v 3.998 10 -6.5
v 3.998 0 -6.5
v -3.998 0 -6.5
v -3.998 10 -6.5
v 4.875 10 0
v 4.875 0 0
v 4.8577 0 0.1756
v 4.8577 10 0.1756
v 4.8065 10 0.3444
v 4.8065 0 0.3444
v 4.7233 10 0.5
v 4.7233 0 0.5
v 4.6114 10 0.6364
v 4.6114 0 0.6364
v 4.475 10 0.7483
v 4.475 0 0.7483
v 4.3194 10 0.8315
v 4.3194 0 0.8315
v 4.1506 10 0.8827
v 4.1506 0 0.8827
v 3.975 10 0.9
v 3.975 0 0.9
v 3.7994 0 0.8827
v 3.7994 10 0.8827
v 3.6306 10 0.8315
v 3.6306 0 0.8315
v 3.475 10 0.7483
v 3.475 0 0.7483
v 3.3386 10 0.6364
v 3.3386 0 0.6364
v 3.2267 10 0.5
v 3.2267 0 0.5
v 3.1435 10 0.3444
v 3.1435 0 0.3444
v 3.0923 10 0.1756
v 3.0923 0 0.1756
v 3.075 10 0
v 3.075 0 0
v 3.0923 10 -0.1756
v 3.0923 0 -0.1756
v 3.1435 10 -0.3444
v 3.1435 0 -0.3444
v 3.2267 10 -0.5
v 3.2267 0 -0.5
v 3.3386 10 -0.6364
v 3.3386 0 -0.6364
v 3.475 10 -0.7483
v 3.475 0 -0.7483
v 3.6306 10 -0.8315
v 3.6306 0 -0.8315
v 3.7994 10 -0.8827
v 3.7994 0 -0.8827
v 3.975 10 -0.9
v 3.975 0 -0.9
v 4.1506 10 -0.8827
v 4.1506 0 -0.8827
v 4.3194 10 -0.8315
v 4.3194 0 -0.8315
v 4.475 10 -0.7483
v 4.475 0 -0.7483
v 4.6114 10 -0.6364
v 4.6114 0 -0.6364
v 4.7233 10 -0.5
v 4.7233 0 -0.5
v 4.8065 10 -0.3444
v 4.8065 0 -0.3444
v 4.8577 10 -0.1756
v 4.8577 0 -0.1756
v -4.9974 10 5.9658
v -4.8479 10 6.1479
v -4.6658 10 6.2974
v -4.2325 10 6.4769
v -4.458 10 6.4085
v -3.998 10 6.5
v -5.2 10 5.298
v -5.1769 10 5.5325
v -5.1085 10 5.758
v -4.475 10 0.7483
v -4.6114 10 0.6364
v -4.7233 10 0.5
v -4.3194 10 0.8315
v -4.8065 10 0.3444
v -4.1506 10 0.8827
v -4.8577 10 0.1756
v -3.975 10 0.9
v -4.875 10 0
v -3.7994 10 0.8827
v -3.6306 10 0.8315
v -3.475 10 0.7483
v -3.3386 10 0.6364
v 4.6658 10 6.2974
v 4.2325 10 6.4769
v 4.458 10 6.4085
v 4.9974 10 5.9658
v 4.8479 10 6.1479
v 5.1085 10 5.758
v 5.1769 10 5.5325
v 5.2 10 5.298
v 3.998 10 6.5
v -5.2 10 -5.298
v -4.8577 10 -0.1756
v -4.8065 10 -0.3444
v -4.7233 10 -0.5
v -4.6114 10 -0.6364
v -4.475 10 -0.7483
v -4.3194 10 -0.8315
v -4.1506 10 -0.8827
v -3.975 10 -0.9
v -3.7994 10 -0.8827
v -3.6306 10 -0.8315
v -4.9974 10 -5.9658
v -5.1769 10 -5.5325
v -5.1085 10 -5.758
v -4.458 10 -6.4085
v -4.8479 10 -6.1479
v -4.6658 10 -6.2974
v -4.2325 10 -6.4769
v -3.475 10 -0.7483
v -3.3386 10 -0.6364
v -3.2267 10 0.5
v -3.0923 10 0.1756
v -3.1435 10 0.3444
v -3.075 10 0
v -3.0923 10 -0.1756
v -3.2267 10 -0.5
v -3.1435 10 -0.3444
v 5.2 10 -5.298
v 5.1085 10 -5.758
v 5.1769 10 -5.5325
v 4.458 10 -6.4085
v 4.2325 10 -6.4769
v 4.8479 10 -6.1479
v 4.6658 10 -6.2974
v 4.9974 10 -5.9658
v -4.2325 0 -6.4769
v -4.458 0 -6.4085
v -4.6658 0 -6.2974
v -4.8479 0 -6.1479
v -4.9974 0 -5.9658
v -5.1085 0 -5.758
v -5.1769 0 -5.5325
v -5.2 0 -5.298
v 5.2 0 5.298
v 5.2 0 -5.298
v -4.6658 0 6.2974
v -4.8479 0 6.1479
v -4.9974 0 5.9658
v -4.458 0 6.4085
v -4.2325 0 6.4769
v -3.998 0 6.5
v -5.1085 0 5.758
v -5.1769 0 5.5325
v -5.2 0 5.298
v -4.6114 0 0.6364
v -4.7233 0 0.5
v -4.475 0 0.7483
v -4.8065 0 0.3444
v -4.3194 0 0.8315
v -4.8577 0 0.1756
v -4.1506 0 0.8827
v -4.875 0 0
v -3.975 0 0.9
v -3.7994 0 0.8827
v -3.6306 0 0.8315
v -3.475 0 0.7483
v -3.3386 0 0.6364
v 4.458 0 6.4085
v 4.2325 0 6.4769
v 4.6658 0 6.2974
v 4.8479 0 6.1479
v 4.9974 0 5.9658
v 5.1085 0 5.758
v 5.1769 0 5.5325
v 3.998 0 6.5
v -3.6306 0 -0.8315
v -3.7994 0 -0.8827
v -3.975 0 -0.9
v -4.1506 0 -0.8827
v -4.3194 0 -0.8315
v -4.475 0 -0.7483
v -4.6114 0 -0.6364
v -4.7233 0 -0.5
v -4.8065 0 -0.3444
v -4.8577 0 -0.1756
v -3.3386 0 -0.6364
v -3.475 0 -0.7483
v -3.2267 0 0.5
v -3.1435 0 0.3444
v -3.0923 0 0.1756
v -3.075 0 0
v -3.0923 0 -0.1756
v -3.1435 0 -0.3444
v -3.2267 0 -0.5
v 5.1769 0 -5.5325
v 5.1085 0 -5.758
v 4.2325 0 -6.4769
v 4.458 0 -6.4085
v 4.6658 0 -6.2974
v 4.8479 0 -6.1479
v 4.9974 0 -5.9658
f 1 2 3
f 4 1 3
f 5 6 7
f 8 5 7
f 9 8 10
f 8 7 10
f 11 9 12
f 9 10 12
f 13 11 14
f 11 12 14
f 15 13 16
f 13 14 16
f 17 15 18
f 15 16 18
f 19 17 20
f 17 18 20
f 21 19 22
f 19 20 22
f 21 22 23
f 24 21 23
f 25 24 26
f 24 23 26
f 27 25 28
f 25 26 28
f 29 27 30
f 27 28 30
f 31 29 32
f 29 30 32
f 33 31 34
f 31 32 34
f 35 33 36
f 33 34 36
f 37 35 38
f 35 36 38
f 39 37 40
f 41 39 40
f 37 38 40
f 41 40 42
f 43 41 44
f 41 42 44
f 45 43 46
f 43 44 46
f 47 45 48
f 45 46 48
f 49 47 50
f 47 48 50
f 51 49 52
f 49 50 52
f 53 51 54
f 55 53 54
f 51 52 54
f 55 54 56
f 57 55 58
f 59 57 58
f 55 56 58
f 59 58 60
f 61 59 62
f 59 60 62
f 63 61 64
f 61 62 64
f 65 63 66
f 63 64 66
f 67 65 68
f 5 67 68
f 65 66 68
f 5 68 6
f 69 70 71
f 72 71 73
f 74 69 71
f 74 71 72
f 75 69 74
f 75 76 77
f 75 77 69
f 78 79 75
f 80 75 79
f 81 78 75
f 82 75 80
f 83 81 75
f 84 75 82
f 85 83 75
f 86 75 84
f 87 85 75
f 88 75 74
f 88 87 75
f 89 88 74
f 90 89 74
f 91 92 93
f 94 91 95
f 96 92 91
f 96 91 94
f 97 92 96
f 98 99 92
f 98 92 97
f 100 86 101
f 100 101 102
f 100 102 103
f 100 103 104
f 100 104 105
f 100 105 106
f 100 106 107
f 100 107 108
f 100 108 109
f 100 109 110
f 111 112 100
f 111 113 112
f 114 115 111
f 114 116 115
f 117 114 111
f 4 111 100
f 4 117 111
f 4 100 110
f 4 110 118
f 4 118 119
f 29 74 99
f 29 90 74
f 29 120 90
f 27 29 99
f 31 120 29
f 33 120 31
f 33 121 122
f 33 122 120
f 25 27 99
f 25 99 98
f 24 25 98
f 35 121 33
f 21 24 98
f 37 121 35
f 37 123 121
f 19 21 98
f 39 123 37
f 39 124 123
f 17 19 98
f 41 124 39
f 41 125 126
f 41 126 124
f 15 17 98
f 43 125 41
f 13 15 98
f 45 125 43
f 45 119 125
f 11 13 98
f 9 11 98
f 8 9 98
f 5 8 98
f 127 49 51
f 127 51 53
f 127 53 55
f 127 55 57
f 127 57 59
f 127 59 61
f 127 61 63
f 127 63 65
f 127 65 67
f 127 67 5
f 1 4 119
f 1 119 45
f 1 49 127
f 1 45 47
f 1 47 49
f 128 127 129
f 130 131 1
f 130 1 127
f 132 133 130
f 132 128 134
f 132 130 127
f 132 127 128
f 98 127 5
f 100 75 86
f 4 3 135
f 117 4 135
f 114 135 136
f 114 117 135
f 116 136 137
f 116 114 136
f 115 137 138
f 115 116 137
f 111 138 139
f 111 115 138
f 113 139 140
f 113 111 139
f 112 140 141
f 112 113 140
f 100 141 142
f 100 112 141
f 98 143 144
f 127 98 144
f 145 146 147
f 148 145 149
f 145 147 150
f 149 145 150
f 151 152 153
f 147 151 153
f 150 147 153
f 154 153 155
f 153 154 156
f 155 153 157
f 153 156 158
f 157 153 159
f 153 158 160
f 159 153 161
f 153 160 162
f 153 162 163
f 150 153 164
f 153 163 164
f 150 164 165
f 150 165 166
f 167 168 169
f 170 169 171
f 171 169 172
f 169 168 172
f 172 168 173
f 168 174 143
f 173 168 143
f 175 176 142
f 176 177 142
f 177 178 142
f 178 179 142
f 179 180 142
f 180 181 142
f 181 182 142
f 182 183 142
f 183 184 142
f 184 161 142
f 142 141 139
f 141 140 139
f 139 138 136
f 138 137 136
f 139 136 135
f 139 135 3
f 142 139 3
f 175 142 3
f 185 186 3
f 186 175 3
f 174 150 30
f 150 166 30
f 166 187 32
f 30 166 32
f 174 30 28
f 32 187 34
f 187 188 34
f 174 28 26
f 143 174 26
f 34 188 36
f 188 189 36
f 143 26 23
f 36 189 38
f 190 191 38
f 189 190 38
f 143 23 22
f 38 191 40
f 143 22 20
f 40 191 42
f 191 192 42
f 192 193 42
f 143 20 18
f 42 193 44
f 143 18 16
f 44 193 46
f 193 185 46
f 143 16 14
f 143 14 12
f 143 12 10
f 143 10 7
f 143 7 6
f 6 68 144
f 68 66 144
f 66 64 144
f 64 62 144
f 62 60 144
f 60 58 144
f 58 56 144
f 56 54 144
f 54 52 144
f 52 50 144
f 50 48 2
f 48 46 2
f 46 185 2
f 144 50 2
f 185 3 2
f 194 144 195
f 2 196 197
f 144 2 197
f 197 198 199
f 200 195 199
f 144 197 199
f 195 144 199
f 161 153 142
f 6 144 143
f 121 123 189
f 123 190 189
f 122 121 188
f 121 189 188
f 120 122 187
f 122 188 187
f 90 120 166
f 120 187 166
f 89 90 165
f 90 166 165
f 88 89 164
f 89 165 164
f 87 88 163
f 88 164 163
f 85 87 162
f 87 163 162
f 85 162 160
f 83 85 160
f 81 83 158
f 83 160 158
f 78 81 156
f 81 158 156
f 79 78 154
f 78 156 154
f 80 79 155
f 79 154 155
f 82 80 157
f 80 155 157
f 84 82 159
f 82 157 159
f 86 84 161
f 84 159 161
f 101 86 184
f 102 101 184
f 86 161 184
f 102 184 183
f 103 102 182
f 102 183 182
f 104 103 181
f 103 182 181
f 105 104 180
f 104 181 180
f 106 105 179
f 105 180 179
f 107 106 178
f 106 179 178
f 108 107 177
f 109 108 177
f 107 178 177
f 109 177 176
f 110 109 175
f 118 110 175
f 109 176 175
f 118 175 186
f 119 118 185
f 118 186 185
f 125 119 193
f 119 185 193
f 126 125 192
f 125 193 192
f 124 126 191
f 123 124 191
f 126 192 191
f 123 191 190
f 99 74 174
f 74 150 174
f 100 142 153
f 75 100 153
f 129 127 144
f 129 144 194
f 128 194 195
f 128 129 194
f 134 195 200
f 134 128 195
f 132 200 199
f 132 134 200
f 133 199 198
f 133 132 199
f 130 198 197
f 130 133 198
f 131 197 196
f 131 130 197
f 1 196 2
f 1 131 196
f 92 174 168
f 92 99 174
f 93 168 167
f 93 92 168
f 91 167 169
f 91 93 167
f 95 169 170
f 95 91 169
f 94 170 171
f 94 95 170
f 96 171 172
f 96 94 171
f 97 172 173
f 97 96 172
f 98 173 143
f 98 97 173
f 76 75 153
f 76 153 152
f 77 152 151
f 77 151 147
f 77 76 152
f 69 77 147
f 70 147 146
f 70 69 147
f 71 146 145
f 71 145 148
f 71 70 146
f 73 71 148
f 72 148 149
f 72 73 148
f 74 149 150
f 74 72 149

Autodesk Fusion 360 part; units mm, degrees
sketch "Sketch1" plane through (0, 0, 0) normal (1, 0, 0) x (0, 0, -1)
sketch "Sketch2" plane through (0, 0, 0) normal (0, 1, 0) x (1, 0, 0)
  line L0 (0, 0) -> (2.75, 0)
  line L1 (0, 0) -> (-2.75, 0)
  line L2 (0, 0) -> (5.2, 0)
  line L3 (0, 0) -> (-5.2, 0)
  circle A0 centre (-3.975, 0) radius 1.225
  circle A1 centre (3.975, 0) radius 1.225
  line L4 (5.2, 6.5) -> (-5.2, 6.5)
  line L5 (-5.2, 6.5) -> (-5.2, -6.5)
  line L6 (-5.2, -6.5) -> (5.2, -6.5)
  line L7 (5.2, -6.5) -> (5.2, 6.5)
  line L8 (5.2, 6.5) -> (-5.2, -6.5) construction
  line L9 (-5.2, 6.5) -> (5.2, -6.5) construction
  circle A2 centre (-3.975, 0) radius 0.9
  circle A3 centre (3.975, 0) radius 0.9
  dimension "d1" = 2.75
  dimension "d2" = 2.75
  dimension "d3" = 5.2
  dimension "d4" = 13
  dimension "d7" = 1.8
  dimension "d8" = 1.8
  dimension "d10" = 2.45
extrude "Extrude1" add sketch "Sketch2" along normal blind 10 contours L0 L1 L2 L3 A0 A1 L4 L5 L7 | L0 L1 L2 L3 A0 A1 L5 L6 L7 | L2 A1 A3 | L2 A1 A3 | L3 A0 A2 | L3 A0 A2
fillet "Fillet1" radius 1.202 4 edges at (-5.2, 5, 6.5) (-5.2, 5, -6.5) (5.2, 5, 6.5) (5.2, 5, -6.5)
equation "d1 = ( 5.5 / 2 ) * 1 mm"
equation "d2 = ( 5.5 / 2 ) * 1 mm"
equation "d3 = ( 10.4 / 2 ) * 1 mm"
